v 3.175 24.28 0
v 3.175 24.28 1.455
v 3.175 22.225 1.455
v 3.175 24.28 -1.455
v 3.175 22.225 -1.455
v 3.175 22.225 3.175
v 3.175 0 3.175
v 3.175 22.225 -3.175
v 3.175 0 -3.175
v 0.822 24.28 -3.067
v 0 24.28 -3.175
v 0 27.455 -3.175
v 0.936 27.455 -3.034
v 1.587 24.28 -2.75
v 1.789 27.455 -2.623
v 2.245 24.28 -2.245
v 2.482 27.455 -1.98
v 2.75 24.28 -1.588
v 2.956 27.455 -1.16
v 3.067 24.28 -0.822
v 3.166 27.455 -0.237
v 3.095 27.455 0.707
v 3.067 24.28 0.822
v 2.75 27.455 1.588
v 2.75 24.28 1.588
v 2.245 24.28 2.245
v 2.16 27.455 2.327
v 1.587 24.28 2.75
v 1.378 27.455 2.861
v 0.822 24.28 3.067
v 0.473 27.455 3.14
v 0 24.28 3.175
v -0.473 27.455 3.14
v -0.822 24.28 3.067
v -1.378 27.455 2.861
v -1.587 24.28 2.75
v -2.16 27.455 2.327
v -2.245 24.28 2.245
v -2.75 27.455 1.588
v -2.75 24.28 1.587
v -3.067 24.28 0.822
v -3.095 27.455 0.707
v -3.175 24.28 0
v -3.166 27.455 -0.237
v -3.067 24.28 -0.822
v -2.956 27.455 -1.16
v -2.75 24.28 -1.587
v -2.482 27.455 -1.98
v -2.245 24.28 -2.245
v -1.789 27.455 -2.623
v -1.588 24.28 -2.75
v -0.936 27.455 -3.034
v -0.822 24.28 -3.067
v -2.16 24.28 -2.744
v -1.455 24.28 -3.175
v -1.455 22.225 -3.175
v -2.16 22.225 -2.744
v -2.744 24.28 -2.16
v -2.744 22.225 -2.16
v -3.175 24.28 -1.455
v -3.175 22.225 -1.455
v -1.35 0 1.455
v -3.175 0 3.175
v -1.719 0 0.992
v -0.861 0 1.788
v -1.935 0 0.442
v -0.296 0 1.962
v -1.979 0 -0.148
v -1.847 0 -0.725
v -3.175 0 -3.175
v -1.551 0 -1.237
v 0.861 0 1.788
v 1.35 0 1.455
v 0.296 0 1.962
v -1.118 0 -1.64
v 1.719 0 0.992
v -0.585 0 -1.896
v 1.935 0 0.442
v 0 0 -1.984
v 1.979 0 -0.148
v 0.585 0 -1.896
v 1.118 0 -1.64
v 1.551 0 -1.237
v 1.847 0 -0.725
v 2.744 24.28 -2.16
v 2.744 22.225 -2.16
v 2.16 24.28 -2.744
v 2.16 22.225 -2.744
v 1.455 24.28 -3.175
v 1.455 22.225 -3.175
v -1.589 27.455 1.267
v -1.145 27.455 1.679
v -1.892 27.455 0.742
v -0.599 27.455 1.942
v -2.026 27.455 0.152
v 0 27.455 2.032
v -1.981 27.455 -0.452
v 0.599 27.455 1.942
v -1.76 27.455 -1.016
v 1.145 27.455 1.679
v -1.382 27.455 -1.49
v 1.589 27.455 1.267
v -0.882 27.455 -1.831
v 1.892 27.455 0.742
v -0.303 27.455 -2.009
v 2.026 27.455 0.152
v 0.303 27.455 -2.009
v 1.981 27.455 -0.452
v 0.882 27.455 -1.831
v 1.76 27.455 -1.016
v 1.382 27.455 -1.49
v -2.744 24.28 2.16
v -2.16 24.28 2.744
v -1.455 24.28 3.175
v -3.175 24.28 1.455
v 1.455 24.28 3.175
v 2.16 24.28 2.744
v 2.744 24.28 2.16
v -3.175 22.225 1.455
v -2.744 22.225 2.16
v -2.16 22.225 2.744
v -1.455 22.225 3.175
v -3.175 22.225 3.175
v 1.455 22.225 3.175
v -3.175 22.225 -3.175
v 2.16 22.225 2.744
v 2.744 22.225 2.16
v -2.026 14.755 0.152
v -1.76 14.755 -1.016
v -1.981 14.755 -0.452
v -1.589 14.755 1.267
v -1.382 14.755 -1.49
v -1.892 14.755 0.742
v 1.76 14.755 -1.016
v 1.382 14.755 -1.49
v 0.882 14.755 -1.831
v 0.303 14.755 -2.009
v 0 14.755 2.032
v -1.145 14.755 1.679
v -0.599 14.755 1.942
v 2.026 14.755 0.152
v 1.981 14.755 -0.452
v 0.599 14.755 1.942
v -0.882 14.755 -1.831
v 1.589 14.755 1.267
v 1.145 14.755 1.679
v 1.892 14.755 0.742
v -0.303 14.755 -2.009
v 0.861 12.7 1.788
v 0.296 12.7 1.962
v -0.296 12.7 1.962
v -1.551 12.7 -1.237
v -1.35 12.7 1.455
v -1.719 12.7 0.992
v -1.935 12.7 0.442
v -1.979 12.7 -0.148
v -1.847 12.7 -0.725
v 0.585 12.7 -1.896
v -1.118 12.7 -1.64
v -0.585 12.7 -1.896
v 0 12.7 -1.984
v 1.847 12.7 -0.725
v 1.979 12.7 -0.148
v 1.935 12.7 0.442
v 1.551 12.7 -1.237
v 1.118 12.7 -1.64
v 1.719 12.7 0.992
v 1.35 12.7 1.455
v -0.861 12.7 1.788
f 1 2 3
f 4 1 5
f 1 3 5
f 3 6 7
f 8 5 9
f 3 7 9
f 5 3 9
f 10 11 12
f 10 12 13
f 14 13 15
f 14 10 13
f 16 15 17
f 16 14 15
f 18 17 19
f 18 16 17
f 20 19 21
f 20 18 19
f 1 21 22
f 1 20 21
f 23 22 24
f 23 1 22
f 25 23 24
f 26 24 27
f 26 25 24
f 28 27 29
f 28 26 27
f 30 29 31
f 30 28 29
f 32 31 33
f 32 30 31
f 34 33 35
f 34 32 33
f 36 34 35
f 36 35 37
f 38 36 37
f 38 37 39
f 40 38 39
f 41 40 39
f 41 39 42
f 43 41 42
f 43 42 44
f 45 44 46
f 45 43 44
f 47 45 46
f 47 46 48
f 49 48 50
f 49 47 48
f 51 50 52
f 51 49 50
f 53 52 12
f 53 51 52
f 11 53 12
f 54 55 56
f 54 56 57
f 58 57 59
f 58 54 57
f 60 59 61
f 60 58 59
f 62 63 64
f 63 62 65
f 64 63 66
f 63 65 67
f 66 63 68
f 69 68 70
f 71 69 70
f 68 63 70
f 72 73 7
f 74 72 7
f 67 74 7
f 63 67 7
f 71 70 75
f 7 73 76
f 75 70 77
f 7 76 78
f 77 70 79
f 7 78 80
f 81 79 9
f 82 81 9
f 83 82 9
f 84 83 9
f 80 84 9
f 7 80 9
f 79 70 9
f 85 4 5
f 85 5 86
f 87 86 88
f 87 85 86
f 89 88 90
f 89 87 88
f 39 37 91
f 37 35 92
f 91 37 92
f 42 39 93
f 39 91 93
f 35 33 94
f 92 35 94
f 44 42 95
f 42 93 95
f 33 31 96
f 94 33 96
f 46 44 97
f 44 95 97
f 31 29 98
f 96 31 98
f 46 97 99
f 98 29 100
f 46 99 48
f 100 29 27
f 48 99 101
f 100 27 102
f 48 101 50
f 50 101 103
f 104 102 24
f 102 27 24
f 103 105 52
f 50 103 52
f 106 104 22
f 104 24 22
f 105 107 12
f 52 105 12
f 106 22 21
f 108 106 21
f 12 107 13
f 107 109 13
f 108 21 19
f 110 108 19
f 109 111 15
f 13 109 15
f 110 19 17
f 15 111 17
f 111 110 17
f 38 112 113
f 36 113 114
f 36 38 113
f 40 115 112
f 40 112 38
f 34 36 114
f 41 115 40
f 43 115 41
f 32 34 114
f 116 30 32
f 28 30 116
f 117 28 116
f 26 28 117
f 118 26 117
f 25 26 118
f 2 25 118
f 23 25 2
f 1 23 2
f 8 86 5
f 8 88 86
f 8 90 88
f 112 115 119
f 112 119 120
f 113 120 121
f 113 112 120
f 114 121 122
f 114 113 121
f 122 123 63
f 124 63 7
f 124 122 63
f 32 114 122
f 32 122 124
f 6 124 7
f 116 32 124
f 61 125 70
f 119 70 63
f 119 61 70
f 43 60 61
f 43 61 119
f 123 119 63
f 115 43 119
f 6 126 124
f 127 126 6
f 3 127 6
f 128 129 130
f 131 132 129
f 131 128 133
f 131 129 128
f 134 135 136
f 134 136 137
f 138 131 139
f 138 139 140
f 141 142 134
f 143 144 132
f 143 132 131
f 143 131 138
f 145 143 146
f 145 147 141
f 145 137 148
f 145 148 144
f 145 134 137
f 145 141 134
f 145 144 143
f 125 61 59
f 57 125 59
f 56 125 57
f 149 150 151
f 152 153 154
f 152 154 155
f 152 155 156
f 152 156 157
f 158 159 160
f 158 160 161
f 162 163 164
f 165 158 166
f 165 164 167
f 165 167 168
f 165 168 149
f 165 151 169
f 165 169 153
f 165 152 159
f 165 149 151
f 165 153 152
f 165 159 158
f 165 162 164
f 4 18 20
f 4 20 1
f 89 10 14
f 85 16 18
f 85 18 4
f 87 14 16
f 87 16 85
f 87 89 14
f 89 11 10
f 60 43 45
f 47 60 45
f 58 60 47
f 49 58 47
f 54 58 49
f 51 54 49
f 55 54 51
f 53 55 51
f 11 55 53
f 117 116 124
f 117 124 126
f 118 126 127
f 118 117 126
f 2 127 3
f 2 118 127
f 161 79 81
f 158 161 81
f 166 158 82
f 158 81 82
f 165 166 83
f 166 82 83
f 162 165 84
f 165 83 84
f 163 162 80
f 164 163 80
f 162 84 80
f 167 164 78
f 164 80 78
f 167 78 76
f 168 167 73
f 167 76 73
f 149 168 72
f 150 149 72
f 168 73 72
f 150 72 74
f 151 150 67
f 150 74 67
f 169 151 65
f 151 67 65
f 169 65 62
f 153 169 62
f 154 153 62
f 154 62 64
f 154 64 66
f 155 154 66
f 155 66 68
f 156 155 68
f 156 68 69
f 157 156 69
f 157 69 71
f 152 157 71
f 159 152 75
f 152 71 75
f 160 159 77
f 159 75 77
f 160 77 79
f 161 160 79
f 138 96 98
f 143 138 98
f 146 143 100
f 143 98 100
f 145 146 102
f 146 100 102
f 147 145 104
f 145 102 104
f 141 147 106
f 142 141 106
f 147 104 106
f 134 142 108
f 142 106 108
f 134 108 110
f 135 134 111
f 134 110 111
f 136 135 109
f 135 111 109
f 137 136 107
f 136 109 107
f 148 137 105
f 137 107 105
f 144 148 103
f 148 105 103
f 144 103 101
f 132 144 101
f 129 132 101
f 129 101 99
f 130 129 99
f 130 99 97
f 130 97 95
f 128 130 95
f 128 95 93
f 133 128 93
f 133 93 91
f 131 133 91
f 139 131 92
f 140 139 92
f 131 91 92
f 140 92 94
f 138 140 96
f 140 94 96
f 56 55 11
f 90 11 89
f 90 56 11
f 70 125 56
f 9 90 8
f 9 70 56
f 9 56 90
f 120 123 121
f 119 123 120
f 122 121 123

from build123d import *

# Parameters (mm, degrees)
SKETCH1_W           = 6.35
SKETCH1_H           = 6.35
BOSS_EXTRUDE1_DEPTH = 22.225
SKETCH2_R           = 3.175
BOSS_EXTRUDE2_DEPTH = 27.45486
BOSS_EXTRUDE3_DEPTH = 2.05486
SKETCH5_R           = 1.984375
CUT_EXTRUDE1_DEPTH  = 12.7
SKETCH6_R           = 2.032
CUT_EXTRUDE2_DEPTH  = 12.7


with BuildPart() as part:
    # Sketch1 → Boss-Extrude1 (new body)
    with BuildSketch(Plane(origin=(0, 0, 0), x_dir=(1, 0, 0), z_dir=(0, 1, 0))):
        Rectangle(SKETCH1_W, SKETCH1_H)
    extrude(amount=BOSS_EXTRUDE1_DEPTH)

    # Sketch2 → Boss-Extrude2 (add)
    with BuildSketch(Plane.XZ):
        with Locations(Location((0, 0, 0), (0, 0, 270))):
            Circle(SKETCH2_R)
    extrude(amount=-BOSS_EXTRUDE2_DEPTH)

    # Sketch4 → Boss-Extrude3 (add)
    with BuildSketch(Plane(origin=(0, 24.27986, 0), x_dir=(1, 0, 0), z_dir=(0, 1, 0))):
        with BuildLine():
            Line((-3.175, 0), (-3.175, -1.454967783))
            ThreePointArc((-3.175, -1.454967783), (-2.469570433, -2.469570433), (-1.454967783, -3.175))
            Line((-1.454967783, -3.175), (0, -3.175))
            Line((0, -3.175), (1.454967783, -3.175))
            ThreePointArc((1.454967783, -3.175), (2.469570433, -2.469570433), (3.175, -1.454967783))
            Line((3.175, -1.454967783), (3.175, 0))
            Line((3.175, 0), (3.175, 1.454967783))
            ThreePointArc((3.175, 1.454967783), (2.469570433, 2.469570433), (1.454967783, 3.175))
            Line((1.454967783, 3.175), (0, 3.175))
            Line((0, 3.175), (-1.454967783, 3.175))
            ThreePointArc((-1.454967783, 3.175), (-2.469570433, 2.469570433), (-3.175, 1.454967783))
            Line((-3.175, 1.454967783), (-3.175, 0))
        make_face()
    extrude(amount=-BOSS_EXTRUDE3_DEPTH)

    # Sketch5 → Cut-Extrude1 (cut)
    with BuildSketch(Plane.XZ):
        with Locations(Location((0, 0, 0), (0, 0, 270))):
            Circle(SKETCH5_R)
    extrude(amount=-CUT_EXTRUDE1_DEPTH, mode=Mode.SUBTRACT)

    # Sketch6 → Cut-Extrude2 (cut)
    with BuildSketch(Plane(origin=(0, 27.45486, 0), x_dir=(1, 0, 0), z_dir=(0, 1, 0))):
        with Locations(Location((0, 0, 0), (0, 0, 270))):
            Circle(SKETCH6_R)
    extrude(amount=-CUT_EXTRUDE2_DEPTH, mode=Mode.SUBTRACT)


solid = part.part
